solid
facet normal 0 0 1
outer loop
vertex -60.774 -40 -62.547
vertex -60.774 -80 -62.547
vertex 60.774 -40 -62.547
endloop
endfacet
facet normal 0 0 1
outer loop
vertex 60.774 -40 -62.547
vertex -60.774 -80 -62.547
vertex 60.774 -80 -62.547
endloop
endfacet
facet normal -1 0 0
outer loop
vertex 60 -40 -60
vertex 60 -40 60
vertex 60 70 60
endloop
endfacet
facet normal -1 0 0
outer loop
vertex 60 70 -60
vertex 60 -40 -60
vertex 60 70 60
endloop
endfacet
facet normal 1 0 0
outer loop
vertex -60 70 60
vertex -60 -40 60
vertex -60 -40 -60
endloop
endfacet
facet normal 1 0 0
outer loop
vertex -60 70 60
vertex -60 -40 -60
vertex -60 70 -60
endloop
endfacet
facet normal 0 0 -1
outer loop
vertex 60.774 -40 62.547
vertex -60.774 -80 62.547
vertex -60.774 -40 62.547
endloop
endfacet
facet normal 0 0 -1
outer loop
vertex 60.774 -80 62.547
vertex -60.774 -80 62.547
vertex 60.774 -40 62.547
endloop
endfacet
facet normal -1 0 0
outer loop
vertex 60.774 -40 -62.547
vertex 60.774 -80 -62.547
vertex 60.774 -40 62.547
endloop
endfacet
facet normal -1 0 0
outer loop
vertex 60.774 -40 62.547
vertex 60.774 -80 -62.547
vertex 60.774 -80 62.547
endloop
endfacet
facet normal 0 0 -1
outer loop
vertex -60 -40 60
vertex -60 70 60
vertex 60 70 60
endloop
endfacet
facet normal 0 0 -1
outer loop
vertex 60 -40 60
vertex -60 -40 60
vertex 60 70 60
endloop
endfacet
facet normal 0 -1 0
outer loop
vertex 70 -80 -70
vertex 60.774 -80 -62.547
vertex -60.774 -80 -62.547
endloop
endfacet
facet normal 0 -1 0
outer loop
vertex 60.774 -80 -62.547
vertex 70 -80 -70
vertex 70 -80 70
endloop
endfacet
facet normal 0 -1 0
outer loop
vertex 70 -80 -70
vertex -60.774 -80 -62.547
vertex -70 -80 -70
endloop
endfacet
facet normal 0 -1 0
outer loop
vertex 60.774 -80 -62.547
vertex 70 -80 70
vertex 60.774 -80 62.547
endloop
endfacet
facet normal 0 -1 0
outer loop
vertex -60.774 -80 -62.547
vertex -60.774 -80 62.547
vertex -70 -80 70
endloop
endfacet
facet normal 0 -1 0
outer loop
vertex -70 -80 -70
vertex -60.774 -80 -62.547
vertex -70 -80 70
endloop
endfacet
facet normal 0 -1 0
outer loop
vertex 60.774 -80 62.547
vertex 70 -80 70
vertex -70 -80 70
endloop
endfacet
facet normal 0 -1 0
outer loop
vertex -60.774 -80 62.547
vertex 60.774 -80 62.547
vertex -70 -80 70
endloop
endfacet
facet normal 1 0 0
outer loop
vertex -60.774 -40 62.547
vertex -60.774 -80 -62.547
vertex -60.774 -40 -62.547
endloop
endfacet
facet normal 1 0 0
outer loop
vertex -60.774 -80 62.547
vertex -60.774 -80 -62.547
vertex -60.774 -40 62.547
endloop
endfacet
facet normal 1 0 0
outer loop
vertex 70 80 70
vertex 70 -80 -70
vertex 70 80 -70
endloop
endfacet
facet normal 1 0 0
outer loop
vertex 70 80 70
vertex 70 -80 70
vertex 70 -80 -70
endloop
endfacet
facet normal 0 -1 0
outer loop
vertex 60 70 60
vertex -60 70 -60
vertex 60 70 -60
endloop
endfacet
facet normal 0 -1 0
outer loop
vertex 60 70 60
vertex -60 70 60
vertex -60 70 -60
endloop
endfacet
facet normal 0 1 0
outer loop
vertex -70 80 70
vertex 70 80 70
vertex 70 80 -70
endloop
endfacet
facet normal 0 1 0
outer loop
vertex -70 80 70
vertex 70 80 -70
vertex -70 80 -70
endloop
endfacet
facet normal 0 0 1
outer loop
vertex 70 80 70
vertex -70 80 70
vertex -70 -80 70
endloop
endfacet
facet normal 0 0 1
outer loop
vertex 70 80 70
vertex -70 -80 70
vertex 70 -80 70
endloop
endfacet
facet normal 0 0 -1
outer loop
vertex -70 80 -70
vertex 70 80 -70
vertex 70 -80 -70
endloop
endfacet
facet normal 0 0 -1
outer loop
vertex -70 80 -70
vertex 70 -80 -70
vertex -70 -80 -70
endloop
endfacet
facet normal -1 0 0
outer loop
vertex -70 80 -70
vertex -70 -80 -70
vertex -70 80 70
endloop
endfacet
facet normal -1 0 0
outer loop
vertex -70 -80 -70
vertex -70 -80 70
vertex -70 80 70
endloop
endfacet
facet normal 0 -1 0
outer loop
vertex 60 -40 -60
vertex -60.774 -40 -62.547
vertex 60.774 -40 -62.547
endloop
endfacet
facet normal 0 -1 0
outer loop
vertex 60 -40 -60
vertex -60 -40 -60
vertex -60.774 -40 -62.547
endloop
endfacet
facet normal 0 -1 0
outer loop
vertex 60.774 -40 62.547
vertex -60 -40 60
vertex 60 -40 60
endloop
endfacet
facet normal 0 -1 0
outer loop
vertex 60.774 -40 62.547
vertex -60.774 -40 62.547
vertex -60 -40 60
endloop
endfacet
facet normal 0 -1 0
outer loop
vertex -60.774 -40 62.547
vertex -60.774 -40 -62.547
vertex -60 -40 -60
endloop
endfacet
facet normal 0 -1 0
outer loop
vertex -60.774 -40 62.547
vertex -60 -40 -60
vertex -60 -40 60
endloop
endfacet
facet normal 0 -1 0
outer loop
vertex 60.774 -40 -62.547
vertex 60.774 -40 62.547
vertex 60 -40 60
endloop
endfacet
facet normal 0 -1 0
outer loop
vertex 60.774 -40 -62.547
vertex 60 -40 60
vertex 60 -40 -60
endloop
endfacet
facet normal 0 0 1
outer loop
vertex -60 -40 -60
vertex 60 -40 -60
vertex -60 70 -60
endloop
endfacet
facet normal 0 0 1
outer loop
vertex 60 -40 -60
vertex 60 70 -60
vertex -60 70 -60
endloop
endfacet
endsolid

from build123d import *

# Parameters (mm, degrees)
SKETCH1_W           = 140
SKETCH1_H           = 160
SKETCH1_W_2         = 120
SKETCH1_H_2         = 140
EXTRUDE_THIN1_DEPTH = 60
SKETCH2_W           = 140
SKETCH2_H           = 160
BOSS_EXTRUDE1_DEPTH = 10
SKETCH5_W           = 140
SKETCH5_H           = 160
BOSS_EXTRUDE2_DEPTH = 10
SKETCH7_W           = 121.54877743
SKETCH7_H           = 125.094770936
CUT_EXTRUDE2_DEPTH  = 40


with BuildPart() as part:
    # Sketch1 → Extrude-Thin1 (new, symmetric)
    with BuildSketch(Plane.XY):
        Rectangle(SKETCH1_W, SKETCH1_H)
        Rectangle(SKETCH1_W_2, SKETCH1_H_2, mode=Mode.SUBTRACT)
    extrude(amount=EXTRUDE_THIN1_DEPTH, both=True)

    # Sketch2 → Boss-Extrude1 (add)
    with BuildSketch(Plane.XY.offset(60)):
        Rectangle(SKETCH2_W, SKETCH2_H)
    extrude(amount=BOSS_EXTRUDE1_DEPTH)

    # Sketch5 → Boss-Extrude2 (add)
    with BuildSketch(Plane(origin=(0, 0, -60), x_dir=(-1, 0, 0), z_dir=(0, 0, -1))):
        Rectangle(SKETCH5_W, SKETCH5_H)
    extrude(amount=BOSS_EXTRUDE2_DEPTH)

    # Sketch7 → Cut-Extrude2 (cut)
    with BuildSketch(Plane.XZ.offset(80)):
        Rectangle(SKETCH7_W, SKETCH7_H)
    extrude(amount=-CUT_EXTRUDE2_DEPTH, mode=Mode.SUBTRACT)


solid = part.part
